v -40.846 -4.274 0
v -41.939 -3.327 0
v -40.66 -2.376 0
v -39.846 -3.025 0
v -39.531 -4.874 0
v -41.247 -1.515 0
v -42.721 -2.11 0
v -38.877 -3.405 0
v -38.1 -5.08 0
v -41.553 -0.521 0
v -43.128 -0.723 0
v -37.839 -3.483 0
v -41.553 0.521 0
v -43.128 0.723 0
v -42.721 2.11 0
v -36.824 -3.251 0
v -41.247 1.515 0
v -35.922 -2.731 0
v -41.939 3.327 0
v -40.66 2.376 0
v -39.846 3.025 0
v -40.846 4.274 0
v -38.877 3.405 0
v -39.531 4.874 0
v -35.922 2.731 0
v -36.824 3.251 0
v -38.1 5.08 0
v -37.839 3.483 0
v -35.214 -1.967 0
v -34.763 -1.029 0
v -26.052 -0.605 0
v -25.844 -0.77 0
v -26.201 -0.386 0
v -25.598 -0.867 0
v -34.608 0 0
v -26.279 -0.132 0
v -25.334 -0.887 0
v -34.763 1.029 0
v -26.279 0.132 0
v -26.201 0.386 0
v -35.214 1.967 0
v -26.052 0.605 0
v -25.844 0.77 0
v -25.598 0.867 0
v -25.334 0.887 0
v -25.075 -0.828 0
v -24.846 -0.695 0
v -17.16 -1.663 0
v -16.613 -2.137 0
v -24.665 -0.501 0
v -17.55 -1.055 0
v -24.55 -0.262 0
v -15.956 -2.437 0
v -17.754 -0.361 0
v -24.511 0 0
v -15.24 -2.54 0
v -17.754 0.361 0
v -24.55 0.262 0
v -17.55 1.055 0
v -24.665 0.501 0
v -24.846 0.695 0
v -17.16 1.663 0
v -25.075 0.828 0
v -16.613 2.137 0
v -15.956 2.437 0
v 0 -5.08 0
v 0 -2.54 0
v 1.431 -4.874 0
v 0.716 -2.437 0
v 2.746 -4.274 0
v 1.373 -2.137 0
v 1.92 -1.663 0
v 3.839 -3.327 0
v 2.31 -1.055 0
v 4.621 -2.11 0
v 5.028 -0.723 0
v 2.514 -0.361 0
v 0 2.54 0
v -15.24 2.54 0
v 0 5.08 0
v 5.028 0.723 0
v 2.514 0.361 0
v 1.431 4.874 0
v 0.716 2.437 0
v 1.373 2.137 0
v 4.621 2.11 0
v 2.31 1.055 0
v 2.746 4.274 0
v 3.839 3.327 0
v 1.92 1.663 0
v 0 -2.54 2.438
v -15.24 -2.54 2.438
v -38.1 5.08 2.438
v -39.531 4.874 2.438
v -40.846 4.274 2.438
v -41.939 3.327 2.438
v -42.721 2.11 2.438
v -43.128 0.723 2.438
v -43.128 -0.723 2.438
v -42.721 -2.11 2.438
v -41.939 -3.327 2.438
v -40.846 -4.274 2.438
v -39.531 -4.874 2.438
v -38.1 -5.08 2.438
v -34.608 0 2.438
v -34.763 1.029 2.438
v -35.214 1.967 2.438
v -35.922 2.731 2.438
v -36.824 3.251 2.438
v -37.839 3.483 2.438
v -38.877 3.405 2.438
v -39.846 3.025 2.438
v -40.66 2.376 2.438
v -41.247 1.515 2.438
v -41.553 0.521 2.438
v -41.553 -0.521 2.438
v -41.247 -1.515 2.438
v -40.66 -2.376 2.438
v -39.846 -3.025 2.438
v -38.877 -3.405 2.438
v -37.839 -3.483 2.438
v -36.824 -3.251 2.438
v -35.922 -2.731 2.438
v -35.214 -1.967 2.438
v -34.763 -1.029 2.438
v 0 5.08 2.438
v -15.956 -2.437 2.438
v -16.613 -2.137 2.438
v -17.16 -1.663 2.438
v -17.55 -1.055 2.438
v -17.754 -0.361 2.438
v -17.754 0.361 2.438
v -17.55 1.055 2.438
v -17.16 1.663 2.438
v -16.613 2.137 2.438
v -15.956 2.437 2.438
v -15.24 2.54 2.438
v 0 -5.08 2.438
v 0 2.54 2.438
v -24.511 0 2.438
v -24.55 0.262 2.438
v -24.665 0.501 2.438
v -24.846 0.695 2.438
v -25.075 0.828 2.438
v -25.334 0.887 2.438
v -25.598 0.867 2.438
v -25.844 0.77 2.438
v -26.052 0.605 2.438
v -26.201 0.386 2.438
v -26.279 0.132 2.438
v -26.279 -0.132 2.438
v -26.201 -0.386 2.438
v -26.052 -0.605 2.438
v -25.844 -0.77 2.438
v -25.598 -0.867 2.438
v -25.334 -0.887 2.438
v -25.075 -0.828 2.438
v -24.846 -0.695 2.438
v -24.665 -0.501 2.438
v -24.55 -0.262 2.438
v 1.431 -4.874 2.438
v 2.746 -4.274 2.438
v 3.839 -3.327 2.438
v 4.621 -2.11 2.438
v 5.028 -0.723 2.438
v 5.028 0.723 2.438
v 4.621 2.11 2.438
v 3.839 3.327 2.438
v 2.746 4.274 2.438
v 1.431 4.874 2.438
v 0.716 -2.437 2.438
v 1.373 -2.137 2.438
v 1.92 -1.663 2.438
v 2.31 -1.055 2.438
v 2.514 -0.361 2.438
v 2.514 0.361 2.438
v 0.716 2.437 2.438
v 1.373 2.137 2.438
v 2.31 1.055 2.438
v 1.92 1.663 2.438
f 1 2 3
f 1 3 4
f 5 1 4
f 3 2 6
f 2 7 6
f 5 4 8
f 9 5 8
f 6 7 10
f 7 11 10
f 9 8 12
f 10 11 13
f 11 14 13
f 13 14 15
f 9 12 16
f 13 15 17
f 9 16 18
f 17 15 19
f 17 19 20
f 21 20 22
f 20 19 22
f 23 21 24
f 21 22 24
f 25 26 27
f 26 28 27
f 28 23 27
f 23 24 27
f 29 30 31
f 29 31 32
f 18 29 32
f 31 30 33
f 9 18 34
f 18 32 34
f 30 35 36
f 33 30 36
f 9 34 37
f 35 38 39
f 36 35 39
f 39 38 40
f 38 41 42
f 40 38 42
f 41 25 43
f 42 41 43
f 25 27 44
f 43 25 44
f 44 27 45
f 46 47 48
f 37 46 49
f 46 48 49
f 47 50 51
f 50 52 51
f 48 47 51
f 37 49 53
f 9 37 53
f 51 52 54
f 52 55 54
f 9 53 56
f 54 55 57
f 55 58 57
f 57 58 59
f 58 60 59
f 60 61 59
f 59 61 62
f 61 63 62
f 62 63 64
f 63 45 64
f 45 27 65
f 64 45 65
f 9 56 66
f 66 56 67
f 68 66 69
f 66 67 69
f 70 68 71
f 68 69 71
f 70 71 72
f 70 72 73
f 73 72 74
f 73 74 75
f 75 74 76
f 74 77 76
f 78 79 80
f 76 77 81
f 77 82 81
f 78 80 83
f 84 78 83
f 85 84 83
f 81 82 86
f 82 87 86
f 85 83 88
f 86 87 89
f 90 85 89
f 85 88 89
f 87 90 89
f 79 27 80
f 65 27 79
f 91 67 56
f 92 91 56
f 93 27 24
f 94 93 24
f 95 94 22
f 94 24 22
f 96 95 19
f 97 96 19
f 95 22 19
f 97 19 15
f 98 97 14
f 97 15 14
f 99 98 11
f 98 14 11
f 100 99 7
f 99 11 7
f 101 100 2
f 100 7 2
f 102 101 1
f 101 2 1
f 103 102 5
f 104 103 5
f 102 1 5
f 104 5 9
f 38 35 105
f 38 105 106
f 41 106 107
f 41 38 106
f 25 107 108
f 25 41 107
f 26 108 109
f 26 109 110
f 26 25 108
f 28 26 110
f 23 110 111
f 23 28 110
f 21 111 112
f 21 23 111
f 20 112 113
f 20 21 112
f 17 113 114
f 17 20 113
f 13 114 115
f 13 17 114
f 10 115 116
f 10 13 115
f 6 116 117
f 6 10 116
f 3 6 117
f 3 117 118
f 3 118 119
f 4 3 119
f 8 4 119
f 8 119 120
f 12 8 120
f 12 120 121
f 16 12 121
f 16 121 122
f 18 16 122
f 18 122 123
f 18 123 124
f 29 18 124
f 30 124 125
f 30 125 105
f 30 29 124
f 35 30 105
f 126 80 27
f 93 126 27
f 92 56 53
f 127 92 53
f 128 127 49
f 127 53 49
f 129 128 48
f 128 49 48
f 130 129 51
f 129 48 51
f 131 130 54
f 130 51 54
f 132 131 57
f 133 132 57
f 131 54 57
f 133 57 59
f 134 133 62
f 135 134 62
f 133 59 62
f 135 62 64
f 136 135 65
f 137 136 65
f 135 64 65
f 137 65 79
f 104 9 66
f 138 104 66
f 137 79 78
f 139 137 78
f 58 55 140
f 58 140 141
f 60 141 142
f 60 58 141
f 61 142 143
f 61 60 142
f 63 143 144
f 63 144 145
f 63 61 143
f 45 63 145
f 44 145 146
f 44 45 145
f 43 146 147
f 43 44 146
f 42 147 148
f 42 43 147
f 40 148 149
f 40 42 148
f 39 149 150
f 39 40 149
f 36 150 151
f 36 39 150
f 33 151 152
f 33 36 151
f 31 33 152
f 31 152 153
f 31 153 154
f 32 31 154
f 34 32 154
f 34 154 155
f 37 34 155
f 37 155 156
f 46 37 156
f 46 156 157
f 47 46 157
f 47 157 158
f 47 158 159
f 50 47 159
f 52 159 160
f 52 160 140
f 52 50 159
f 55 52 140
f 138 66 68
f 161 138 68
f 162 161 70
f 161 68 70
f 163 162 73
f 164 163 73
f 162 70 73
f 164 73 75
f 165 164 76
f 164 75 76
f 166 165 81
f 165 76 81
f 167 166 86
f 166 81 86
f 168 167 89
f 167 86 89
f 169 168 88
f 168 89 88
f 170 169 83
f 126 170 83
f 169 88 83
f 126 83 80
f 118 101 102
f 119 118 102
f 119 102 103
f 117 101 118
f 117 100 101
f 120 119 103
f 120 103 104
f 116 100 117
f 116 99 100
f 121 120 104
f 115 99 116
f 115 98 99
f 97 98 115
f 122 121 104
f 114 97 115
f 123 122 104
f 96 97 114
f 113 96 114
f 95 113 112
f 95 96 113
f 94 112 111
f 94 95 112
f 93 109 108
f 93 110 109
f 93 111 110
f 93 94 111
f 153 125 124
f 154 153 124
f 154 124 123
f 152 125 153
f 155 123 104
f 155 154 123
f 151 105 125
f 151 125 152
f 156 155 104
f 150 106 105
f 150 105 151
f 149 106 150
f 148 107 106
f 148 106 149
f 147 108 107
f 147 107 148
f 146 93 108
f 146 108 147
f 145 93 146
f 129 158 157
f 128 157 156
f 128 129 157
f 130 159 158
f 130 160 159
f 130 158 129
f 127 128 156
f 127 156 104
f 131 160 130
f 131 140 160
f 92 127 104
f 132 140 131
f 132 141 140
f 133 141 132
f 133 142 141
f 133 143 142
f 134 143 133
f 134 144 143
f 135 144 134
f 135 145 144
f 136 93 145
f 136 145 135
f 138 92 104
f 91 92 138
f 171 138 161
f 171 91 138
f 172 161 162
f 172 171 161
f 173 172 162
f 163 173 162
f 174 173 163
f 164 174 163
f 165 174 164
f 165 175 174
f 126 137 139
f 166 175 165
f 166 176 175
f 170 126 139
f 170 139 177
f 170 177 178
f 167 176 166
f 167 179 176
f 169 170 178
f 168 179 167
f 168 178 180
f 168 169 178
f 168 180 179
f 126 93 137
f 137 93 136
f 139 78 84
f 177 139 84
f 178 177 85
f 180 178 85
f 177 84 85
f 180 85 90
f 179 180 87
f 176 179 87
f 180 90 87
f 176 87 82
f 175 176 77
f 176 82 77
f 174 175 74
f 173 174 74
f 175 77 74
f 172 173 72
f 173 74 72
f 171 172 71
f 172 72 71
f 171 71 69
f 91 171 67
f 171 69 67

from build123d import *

# Parameters (mm, degrees)
F0_R     = 3.4925
F0_R_2   = 0.889
F1_DEPTH = 2.4384


with BuildPart() as f1:
    # F0 (on Top) → F1 (new body)
    with BuildSketch(Plane.XY):
        with BuildLine():
            Line((-38.1, -5.08), (0, -5.08))
            ThreePointArc((0, -5.08), (5.08, 0), (0, 5.08))
            Line((0, 5.08), (-38.1, 5.08))
            ThreePointArc((-38.1, 5.08), (-43.18, 0), (-38.1, -5.08))
        make_face()
        with Locations((-38.1, 0)):
            Circle(F0_R, mode=Mode.SUBTRACT)
        with Locations((-25.4, 0)):
            Circle(F0_R_2, mode=Mode.SUBTRACT)
        with BuildLine():
            ThreePointArc((0, 2.54), (2.54, 0), (0, -2.54))
            Line((0, -2.54), (-15.24, -2.54))
            ThreePointArc((-15.24, -2.54), (-17.78, 0), (-15.24, 2.54))
            Line((-15.24, 2.54), (0, 2.54))
        make_face(mode=Mode.SUBTRACT)
    extrude(amount=F1_DEPTH)


solid = f1.part
